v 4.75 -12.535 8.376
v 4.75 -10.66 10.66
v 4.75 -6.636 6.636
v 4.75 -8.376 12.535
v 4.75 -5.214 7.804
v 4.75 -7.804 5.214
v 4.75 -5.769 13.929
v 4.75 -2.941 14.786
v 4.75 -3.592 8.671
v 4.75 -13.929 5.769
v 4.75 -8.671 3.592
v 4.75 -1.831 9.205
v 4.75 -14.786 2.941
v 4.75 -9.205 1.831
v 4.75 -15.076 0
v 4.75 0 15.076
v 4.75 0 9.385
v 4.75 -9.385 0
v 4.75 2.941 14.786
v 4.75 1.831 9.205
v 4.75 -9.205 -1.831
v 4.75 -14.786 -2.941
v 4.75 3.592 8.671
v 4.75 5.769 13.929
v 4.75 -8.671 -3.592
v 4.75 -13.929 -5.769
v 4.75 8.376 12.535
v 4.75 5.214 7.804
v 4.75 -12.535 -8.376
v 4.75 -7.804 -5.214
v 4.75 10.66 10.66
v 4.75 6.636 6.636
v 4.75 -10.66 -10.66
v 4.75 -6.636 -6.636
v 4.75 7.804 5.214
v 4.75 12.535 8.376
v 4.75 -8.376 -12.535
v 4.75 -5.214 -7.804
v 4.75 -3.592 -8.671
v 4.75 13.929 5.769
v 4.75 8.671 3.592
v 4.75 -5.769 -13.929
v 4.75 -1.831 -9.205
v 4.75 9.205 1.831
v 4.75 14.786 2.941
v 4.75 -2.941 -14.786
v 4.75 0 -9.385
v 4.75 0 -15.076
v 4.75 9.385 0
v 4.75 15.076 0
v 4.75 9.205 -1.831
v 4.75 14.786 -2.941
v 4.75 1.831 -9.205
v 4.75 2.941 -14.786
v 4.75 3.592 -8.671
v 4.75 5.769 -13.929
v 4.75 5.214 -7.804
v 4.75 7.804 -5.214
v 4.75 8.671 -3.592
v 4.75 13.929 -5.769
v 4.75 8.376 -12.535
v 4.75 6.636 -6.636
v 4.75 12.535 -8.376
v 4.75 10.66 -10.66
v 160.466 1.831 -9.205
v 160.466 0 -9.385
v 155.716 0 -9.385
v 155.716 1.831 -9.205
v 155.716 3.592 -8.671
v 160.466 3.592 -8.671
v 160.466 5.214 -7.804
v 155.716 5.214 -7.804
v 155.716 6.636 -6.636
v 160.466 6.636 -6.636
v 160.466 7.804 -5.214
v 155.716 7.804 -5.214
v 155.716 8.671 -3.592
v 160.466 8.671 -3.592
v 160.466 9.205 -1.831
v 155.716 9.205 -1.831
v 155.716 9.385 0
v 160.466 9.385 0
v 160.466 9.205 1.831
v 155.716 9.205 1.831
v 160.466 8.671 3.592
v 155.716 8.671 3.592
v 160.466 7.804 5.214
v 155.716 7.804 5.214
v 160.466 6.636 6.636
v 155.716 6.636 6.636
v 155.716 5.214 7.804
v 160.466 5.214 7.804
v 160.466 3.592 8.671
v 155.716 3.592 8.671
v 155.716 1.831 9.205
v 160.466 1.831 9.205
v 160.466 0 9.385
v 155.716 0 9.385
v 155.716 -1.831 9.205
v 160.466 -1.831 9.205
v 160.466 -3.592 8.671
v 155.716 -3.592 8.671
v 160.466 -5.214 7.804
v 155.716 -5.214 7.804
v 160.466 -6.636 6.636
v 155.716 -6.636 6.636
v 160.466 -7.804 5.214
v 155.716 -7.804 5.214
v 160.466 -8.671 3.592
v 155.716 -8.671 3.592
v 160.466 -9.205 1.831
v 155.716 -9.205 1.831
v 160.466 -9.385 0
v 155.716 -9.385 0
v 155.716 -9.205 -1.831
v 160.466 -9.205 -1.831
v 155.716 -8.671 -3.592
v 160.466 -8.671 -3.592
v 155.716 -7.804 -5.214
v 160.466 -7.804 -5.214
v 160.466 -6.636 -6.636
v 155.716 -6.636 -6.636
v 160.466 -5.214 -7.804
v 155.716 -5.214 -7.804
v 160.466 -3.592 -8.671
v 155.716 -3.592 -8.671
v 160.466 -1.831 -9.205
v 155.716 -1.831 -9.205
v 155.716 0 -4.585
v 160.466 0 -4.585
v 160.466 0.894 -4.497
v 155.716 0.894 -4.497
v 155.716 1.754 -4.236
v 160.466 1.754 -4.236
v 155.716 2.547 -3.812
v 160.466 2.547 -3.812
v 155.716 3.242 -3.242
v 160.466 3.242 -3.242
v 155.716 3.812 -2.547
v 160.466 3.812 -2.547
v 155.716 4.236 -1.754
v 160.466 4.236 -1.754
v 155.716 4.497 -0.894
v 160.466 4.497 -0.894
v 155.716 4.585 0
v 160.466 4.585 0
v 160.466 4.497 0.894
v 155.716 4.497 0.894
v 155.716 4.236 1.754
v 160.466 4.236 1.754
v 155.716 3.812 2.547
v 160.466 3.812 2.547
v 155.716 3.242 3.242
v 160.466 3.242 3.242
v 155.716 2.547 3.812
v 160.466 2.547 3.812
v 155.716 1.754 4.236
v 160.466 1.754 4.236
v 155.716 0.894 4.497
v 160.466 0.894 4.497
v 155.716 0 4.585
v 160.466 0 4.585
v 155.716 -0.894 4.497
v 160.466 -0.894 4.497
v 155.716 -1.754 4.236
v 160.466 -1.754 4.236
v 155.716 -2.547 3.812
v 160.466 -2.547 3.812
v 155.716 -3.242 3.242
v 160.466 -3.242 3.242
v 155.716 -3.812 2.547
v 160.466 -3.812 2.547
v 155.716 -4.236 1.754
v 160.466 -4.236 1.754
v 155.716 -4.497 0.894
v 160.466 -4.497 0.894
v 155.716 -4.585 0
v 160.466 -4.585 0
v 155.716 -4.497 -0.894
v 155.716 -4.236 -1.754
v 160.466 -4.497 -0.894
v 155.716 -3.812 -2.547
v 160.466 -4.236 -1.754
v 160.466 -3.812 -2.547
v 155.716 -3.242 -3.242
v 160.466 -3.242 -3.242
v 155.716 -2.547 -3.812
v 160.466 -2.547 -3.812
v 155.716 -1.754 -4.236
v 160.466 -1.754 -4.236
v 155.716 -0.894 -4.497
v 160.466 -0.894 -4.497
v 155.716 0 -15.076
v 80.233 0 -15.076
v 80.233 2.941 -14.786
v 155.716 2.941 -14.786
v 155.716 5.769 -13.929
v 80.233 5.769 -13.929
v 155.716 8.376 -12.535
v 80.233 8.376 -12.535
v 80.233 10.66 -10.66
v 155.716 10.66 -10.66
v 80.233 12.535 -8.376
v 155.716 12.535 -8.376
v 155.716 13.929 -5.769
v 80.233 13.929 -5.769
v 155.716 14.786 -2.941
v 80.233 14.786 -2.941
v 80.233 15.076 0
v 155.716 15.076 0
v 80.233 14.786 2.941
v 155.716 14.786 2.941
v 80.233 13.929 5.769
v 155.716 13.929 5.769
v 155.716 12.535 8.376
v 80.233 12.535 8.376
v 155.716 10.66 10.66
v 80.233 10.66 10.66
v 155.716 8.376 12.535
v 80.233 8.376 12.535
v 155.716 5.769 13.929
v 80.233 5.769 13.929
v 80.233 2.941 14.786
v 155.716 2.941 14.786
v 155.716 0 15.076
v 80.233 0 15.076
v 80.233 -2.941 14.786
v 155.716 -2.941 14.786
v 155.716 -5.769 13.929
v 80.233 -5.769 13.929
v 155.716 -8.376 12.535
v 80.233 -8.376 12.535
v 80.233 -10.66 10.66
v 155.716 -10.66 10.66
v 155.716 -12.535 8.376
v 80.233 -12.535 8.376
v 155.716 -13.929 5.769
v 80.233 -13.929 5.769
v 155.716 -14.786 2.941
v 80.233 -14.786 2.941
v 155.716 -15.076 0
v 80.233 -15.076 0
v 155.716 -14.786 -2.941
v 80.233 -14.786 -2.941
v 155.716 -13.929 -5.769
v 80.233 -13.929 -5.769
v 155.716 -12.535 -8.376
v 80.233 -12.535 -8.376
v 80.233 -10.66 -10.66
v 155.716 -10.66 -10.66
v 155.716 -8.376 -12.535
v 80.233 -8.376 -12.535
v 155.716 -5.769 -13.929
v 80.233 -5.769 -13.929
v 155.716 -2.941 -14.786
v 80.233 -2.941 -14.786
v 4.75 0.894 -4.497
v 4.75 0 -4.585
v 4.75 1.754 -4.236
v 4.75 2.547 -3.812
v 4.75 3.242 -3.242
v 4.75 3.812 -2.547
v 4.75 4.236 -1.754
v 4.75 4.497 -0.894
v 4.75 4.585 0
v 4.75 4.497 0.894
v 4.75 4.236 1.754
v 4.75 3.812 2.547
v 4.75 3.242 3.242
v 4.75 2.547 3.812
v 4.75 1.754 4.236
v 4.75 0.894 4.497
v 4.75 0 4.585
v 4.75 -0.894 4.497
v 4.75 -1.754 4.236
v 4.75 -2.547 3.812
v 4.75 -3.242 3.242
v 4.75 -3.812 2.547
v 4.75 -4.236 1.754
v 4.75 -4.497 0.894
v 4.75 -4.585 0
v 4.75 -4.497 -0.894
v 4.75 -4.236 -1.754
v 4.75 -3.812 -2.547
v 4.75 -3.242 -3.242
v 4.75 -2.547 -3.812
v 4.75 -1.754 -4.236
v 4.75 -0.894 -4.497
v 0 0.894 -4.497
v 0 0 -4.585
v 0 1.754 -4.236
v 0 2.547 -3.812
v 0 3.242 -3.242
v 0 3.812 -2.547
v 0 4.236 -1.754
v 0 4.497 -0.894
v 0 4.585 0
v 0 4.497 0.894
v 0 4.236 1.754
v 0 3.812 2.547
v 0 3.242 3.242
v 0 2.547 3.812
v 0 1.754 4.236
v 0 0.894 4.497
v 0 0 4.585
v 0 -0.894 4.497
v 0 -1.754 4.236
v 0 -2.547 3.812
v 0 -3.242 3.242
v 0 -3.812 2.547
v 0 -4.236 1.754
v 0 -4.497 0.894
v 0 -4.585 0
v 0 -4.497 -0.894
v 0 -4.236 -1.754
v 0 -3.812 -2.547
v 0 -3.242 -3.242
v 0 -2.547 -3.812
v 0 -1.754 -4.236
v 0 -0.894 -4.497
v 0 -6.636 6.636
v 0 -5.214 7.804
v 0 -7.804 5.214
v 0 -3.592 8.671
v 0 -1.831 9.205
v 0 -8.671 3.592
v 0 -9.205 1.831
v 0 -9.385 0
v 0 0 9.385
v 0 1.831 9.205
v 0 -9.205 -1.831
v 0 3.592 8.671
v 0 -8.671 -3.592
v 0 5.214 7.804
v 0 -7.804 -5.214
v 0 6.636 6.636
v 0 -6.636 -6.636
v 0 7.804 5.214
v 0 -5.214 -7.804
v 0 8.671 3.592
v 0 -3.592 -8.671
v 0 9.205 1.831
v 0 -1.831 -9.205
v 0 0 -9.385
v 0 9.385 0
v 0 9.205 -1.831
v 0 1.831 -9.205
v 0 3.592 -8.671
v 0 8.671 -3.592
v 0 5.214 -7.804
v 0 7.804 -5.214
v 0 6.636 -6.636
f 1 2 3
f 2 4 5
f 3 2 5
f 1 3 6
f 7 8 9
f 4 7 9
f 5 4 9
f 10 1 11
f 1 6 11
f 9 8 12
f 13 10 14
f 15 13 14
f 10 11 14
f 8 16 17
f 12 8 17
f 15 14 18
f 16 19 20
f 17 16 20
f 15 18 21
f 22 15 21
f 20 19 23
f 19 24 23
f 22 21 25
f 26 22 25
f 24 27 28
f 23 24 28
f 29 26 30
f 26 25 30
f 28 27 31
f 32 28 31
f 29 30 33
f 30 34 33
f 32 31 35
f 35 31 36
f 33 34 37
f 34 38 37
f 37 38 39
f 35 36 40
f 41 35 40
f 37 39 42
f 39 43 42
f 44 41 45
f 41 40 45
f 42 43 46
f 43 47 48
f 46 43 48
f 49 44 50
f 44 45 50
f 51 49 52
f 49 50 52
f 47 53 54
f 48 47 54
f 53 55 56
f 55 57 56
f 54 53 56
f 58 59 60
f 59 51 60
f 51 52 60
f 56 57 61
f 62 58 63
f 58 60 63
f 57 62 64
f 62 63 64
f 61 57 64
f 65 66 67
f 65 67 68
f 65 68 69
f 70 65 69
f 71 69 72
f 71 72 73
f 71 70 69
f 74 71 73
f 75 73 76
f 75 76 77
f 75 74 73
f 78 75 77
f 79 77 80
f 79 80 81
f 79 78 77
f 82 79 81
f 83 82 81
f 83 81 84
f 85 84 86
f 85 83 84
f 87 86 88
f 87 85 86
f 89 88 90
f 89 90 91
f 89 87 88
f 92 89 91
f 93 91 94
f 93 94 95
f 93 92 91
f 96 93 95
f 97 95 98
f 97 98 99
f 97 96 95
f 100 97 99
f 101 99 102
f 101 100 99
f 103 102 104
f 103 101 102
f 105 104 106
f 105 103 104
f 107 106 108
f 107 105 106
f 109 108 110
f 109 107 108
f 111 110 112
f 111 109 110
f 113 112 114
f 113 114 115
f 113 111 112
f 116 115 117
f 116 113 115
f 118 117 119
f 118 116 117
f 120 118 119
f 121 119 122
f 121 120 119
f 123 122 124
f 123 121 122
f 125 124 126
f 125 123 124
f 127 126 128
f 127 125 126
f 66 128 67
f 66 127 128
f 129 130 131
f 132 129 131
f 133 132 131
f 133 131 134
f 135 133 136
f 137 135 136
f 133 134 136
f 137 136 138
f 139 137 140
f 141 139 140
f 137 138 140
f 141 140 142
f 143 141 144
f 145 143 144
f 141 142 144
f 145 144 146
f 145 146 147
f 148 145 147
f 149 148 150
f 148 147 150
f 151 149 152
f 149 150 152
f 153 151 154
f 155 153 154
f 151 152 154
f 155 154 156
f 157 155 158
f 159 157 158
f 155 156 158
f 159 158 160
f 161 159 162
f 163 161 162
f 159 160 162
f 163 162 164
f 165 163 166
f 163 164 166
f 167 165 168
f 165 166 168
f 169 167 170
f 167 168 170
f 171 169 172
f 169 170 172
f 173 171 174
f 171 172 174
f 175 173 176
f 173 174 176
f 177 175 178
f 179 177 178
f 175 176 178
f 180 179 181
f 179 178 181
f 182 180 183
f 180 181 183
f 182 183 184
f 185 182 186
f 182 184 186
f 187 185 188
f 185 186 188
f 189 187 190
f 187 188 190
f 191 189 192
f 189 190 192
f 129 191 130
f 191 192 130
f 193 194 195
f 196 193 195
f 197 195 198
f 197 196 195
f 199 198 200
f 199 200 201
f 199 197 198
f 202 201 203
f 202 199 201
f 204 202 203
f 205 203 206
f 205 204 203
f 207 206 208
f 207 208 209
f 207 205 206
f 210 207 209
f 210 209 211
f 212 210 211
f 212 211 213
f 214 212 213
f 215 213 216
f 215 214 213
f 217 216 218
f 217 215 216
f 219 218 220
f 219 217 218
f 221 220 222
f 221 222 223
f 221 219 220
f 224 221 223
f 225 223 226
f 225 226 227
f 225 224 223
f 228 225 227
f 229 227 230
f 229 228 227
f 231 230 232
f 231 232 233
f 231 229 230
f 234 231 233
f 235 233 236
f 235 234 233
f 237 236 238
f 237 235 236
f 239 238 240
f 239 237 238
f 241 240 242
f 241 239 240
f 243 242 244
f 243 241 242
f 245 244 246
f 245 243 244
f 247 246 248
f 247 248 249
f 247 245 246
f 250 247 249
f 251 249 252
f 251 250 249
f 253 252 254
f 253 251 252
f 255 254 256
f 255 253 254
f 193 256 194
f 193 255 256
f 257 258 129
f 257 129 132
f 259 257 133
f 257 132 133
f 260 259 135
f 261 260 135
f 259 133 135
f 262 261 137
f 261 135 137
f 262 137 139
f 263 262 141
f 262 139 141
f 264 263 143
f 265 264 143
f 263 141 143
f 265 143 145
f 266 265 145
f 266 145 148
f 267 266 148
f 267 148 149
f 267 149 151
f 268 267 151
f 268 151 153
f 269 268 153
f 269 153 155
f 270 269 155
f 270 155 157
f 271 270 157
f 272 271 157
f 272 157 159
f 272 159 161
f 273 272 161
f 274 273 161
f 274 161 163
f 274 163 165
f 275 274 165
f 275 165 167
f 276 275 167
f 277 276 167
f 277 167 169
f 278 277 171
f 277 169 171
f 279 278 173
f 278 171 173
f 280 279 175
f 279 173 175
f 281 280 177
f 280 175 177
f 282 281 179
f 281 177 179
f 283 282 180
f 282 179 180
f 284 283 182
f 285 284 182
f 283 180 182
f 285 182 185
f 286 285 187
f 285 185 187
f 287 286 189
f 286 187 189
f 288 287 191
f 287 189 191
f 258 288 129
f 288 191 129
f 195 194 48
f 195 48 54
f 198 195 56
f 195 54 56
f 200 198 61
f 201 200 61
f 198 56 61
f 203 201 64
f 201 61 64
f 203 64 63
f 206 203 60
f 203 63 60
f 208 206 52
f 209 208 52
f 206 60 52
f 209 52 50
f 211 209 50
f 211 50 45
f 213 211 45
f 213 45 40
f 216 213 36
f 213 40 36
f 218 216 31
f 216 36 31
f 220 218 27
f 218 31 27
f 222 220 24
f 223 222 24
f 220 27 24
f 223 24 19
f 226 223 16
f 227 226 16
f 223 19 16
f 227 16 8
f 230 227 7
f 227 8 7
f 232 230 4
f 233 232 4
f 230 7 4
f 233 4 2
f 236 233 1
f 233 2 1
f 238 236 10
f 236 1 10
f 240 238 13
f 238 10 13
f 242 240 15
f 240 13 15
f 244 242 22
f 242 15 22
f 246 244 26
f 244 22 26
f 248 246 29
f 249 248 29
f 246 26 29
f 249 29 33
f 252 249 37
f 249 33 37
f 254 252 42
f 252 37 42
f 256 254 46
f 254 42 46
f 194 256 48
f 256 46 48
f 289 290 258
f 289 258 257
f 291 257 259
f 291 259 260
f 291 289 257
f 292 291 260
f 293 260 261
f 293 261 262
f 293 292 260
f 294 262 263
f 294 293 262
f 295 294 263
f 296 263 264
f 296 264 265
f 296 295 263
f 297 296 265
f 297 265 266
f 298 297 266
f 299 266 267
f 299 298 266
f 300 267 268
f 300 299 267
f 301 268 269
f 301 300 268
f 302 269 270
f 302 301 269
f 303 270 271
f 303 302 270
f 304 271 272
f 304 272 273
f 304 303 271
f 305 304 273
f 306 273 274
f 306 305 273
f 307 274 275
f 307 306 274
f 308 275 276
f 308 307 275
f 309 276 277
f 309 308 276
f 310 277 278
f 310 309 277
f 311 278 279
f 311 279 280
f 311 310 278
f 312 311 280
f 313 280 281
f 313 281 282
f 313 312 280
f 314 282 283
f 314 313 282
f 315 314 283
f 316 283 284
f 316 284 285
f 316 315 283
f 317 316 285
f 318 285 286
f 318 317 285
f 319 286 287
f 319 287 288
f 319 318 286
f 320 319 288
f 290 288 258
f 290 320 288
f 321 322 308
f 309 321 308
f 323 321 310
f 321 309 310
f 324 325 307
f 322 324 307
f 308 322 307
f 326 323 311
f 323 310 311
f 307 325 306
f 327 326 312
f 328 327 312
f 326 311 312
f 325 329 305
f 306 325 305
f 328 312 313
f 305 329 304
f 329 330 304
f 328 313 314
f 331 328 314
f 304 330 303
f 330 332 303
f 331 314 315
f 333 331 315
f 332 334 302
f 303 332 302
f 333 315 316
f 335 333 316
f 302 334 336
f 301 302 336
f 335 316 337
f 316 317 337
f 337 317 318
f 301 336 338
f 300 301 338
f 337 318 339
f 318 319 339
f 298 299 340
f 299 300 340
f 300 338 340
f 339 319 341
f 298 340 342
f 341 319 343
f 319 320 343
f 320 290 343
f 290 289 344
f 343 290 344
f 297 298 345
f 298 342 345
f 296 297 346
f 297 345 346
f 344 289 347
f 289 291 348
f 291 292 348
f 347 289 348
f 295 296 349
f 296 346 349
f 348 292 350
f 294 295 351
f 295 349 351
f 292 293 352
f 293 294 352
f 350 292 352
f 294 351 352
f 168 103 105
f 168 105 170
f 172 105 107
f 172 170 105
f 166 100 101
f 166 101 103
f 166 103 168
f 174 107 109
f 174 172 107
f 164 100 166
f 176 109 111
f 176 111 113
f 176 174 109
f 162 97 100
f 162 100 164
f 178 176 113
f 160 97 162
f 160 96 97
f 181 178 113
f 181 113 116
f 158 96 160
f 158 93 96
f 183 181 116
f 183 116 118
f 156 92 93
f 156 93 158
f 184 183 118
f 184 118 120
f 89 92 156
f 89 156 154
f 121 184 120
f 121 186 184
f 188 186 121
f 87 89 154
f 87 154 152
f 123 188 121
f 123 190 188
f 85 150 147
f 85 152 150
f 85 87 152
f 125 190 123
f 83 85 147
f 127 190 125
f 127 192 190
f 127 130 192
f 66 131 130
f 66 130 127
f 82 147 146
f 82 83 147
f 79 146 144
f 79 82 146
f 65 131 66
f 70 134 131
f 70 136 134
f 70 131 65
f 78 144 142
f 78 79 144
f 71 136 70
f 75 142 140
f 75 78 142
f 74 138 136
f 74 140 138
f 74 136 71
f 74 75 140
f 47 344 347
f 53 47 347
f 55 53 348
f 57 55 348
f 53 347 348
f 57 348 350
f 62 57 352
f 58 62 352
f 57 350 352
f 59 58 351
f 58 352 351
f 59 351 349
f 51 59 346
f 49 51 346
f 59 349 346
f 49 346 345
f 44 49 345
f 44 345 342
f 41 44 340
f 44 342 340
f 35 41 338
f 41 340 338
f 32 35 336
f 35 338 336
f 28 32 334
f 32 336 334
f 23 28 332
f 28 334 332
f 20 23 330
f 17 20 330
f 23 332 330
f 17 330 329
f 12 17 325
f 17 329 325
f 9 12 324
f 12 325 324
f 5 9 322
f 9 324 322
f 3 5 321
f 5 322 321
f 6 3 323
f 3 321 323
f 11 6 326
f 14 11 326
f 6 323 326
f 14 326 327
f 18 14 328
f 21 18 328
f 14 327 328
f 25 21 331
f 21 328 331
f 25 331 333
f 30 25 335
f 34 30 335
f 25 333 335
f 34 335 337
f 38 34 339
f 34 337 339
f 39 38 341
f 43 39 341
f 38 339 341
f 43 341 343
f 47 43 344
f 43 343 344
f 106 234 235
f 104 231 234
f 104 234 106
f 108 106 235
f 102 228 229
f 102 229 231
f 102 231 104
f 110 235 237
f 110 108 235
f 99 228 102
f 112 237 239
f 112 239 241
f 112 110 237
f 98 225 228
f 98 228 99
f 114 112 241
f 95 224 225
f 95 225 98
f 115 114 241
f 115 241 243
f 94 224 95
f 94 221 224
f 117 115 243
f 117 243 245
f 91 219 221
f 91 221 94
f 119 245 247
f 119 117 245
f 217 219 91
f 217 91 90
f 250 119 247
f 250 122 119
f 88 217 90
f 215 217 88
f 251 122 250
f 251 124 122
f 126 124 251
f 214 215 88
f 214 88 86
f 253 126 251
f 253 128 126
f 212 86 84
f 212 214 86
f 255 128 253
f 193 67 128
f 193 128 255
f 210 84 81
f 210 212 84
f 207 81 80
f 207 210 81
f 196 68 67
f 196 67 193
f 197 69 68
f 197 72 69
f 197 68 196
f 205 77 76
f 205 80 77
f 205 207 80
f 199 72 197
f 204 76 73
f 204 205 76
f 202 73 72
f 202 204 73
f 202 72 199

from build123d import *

# Parameters (mm, degrees)
SKETCH4_R           = 9.3853
SKETCH4_R_2         = 4.5847
BOSS_EXTRUDE1_DEPTH = 4.7498
SKETCH5_R           = 15.07617
BOSS_EXTRUDE2_DEPTH = 75.48314015
SKETCH6_R           = 4.5847
CUT_EXTRUDE1_DEPTH  = 158.168951984


with BuildPart() as part:
    # Sketch4 → Boss-Extrude1 (new body)
    with BuildSketch(Plane(origin=(0, 0, 0), x_dir=(0, 0, -1), z_dir=(1, 0, 0))):
        Circle(SKETCH4_R)
        Circle(SKETCH4_R_2, mode=Mode.SUBTRACT)
    boss_extrude1 = extrude(amount=BOSS_EXTRUDE1_DEPTH)

    # Sketch5 → Boss-Extrude2 (add)
    with BuildSketch(Plane(origin=(4.7498, 0, 0), x_dir=(0, 0, -1), z_dir=(1, 0, 0))):
        Circle(SKETCH5_R)
    boss_extrude2 = extrude(amount=BOSS_EXTRUDE2_DEPTH)

    # Mirror3: Boss-Extrude2 across plane
    add(boss_extrude2.mirror(Plane(origin=(80.23294015, 0, 0), x_dir=(0, 0, 1), z_dir=(1, 0, 0))))

    # Mirror4: Boss-Extrude1 across plane
    add(boss_extrude1.mirror(Plane(origin=(80.23294015, 0, 0), x_dir=(0, 0, 1), z_dir=(1, 0, 0))))

    # Sketch6 → Cut-Extrude1 (cut, through all)
    with BuildSketch(Plane(origin=(155.7160803, 0, 0), x_dir=(0, 0, -1), z_dir=(1, 0, 0))):
        Circle(SKETCH6_R)
    extrude(amount=-CUT_EXTRUDE1_DEPTH, mode=Mode.SUBTRACT)


solid = part.part
